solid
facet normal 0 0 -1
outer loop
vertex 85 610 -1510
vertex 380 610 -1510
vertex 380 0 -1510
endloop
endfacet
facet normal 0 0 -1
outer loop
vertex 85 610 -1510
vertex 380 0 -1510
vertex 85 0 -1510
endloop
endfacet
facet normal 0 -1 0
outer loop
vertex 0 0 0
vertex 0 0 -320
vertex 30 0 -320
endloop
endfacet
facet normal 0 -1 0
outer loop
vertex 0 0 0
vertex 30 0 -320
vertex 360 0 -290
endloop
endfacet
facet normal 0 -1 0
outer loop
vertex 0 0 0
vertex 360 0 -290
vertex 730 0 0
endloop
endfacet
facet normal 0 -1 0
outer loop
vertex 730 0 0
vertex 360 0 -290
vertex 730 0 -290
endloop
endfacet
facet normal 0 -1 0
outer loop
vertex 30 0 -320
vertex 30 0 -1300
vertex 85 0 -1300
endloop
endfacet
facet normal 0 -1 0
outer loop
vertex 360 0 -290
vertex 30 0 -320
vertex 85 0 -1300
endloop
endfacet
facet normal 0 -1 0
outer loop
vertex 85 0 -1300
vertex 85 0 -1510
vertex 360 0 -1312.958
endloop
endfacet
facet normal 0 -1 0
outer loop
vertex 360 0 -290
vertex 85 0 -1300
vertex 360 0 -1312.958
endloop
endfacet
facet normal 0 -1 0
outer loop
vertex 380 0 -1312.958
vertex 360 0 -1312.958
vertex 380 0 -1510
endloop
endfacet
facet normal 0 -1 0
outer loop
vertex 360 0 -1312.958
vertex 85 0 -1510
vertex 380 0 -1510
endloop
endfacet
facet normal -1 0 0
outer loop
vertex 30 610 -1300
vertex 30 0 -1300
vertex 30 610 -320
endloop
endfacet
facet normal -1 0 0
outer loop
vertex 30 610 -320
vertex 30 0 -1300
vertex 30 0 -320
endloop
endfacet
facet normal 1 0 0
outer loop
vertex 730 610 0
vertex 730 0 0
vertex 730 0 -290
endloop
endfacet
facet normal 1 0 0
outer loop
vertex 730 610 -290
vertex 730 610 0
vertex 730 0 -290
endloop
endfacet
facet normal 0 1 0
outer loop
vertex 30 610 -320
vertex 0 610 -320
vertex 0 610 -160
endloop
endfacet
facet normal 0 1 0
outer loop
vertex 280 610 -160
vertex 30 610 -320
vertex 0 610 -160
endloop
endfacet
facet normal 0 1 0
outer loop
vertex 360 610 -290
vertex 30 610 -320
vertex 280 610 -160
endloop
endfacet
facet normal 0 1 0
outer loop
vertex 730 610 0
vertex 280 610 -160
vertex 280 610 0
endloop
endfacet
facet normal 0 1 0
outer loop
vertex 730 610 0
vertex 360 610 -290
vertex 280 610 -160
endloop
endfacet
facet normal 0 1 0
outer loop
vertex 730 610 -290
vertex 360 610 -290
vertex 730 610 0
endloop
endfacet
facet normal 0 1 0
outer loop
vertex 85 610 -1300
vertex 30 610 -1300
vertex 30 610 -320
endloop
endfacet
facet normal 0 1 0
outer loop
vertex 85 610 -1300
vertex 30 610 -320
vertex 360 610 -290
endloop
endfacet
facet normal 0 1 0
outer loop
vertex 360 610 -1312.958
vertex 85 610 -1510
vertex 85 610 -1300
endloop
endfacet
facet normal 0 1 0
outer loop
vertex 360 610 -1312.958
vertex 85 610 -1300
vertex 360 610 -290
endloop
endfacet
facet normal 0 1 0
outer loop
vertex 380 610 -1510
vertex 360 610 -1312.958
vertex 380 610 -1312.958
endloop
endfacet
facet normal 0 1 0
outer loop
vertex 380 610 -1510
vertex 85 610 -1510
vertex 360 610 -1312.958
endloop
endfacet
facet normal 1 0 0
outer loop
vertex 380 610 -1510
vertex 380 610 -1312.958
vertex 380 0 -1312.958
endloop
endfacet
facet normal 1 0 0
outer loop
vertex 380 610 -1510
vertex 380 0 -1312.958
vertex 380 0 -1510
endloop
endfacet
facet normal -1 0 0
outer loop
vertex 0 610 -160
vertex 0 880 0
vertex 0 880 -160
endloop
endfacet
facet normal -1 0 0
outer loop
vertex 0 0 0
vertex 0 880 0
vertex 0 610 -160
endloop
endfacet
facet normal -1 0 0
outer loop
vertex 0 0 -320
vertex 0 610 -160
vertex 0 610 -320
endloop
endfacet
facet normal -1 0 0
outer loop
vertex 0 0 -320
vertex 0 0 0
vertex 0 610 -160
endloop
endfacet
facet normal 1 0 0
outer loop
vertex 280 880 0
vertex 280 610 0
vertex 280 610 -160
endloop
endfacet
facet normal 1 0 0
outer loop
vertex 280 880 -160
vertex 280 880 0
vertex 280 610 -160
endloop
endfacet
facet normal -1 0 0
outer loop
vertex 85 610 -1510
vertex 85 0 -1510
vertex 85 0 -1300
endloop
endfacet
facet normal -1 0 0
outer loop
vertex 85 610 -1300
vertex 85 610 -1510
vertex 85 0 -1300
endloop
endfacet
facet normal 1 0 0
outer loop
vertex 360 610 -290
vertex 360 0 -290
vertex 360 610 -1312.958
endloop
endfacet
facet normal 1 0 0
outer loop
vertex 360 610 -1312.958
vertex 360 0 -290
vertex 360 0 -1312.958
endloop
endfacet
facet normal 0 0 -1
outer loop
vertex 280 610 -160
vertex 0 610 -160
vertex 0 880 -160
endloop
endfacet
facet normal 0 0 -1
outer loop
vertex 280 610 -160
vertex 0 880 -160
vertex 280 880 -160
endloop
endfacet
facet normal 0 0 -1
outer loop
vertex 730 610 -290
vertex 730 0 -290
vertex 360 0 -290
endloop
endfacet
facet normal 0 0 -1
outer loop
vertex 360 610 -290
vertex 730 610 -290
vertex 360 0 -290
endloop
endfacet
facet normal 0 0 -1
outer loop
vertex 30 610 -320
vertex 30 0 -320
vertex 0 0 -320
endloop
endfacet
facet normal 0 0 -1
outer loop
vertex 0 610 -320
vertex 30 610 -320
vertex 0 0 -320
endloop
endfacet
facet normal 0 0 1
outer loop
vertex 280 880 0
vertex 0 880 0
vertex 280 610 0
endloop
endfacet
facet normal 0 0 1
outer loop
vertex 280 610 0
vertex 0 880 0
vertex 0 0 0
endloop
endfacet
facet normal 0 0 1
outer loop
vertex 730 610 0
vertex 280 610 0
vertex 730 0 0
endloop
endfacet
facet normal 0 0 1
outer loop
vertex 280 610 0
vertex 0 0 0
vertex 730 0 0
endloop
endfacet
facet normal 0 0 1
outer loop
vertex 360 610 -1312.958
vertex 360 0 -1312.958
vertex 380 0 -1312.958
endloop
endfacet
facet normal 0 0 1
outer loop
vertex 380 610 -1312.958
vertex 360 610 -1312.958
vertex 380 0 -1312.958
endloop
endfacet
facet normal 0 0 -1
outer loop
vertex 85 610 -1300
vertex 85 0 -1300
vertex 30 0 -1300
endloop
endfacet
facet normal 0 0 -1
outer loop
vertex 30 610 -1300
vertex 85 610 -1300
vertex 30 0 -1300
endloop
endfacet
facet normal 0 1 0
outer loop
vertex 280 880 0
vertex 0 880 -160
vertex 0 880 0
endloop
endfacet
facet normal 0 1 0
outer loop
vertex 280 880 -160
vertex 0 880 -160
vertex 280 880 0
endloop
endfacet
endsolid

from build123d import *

# Parameters (mm, degrees)
BOSS_EXTRUDE1_DEPTH = 610
SKETCH2_W           = 280
SKETCH2_H           = 160
BOSS_EXTRUDE2_DEPTH = 270


with BuildPart() as part:
    # Sketch1 → Boss-Extrude1 (new body)
    with BuildSketch(Plane(origin=(0, 0, 0), x_dir=(1, 0, 0), z_dir=(0, 1, 0))):
        Polygon((730, 290), (360, 290), (360, 1312.957638722), (380, 1312.957638722), (380, 1510), (85, 1510), (85, 1300), (30, 1300), (30, 320), (0, 320), (0, 0), (730, 0), align=None)
    extrude(amount=BOSS_EXTRUDE1_DEPTH)

    # Sketch2 → Boss-Extrude2 (add)
    with BuildSketch(Plane(origin=(0, 610, 0), x_dir=(1, 0, 0), z_dir=(0, 1, 0))):
        with Locations((140, 80)):
            Rectangle(SKETCH2_W, SKETCH2_H)
    extrude(amount=BOSS_EXTRUDE2_DEPTH)


solid = part.part
